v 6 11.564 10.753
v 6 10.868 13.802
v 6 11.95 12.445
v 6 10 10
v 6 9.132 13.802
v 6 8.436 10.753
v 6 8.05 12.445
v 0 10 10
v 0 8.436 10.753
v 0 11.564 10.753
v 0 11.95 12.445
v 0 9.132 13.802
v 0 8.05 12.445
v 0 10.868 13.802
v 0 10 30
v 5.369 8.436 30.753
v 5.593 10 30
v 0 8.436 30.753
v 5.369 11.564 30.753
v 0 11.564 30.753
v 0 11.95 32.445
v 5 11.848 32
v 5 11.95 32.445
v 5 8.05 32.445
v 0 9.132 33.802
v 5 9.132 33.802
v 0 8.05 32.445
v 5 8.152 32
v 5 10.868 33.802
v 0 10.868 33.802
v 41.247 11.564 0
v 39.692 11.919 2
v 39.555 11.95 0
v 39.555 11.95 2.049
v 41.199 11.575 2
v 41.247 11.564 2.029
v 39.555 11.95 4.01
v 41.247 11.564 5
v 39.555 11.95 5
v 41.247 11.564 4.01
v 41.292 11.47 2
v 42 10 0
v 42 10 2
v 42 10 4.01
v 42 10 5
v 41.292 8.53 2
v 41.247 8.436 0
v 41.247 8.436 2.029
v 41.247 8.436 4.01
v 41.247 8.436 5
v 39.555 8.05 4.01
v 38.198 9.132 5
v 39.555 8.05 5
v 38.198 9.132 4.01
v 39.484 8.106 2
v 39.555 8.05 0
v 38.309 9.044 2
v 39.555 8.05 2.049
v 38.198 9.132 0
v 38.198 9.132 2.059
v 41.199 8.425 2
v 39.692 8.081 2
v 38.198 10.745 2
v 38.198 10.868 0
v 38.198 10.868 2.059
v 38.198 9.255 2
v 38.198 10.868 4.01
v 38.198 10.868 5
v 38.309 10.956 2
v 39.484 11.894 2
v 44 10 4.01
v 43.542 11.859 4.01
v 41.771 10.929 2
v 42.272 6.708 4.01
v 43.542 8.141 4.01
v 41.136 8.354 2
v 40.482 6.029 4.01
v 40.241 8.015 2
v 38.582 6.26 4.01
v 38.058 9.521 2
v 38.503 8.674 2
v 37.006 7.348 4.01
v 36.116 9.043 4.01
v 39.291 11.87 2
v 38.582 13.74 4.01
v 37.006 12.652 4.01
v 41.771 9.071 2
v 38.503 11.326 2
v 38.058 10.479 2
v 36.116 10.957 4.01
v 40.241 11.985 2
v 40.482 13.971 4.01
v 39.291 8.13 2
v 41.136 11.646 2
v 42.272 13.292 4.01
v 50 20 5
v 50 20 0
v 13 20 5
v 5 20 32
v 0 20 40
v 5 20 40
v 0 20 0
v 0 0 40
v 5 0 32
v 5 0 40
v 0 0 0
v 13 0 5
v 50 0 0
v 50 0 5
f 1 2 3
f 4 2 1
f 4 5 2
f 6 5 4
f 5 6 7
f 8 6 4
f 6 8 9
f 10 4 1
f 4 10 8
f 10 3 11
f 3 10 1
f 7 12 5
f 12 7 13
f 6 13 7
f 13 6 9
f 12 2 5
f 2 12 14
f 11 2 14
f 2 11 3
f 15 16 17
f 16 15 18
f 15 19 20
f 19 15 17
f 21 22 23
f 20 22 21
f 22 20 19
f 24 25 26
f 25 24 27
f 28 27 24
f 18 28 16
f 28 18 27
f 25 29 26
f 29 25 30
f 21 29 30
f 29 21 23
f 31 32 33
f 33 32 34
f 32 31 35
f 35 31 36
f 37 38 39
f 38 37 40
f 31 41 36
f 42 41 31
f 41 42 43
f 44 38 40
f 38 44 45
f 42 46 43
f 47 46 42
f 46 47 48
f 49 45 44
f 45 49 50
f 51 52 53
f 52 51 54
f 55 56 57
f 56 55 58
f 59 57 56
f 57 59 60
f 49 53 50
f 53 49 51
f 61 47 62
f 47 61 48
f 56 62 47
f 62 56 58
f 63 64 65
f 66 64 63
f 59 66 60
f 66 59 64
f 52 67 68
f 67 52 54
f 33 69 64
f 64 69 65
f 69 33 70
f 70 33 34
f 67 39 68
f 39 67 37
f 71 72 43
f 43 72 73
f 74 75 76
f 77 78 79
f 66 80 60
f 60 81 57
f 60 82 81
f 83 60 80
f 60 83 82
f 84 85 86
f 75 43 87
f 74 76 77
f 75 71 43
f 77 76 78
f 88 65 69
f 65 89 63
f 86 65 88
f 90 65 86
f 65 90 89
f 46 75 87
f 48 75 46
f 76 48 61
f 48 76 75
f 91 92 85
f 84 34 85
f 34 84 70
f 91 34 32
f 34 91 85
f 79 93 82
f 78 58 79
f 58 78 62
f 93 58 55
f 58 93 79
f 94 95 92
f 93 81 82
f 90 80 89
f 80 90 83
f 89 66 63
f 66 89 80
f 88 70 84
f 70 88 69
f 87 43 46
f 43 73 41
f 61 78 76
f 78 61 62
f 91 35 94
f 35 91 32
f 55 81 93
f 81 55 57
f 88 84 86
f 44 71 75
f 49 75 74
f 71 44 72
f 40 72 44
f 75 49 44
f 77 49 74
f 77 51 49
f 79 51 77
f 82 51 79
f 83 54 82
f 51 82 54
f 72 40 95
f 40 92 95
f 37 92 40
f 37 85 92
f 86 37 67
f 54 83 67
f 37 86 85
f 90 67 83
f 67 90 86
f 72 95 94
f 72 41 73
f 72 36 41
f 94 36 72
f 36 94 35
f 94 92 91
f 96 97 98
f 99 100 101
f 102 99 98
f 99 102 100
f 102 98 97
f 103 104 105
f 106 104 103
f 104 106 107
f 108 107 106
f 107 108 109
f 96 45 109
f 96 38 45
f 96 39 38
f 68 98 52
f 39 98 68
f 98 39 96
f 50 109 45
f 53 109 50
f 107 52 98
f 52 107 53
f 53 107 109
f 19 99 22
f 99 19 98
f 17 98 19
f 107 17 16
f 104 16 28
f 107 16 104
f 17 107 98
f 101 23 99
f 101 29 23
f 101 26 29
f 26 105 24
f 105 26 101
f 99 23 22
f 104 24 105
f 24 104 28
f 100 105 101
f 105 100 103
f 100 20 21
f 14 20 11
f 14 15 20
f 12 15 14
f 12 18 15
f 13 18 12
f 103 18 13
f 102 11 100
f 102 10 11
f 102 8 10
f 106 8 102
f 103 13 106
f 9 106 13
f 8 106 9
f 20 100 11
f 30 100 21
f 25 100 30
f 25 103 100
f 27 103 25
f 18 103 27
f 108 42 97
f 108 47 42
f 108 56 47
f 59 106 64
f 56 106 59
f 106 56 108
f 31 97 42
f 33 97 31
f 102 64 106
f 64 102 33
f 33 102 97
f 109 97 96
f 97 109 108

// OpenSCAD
// Purpose: shelf bracket – profile via polygon, linear_extrude, screw holes with countersink (cone).
l = 50; h = 40; t = 5; b = 20;
module countersink() {
    cylinder(h = t + 2, d = 4);
    translate([0, 0, t - 2]) cylinder(h = 2.01, d1 = 4, d2 = 8);
}
difference() {
    rotate([90, 0, 0]) translate([0, 0, -b]) linear_extrude(height = b)
        polygon([[0, 0], [l, 0], [l, t], [t + 8, t], [t, h - 8], [t, h], [0, h]]);
    // Holes in the wall side
    for (z = [12, h - 8]) translate([-1, b / 2, z]) rotate([0, 90, 0]) cylinder(h = t + 2, d = 4);
    // Countersunk hole in the support
    translate([l - 10, b / 2, -1]) countersink();
}
